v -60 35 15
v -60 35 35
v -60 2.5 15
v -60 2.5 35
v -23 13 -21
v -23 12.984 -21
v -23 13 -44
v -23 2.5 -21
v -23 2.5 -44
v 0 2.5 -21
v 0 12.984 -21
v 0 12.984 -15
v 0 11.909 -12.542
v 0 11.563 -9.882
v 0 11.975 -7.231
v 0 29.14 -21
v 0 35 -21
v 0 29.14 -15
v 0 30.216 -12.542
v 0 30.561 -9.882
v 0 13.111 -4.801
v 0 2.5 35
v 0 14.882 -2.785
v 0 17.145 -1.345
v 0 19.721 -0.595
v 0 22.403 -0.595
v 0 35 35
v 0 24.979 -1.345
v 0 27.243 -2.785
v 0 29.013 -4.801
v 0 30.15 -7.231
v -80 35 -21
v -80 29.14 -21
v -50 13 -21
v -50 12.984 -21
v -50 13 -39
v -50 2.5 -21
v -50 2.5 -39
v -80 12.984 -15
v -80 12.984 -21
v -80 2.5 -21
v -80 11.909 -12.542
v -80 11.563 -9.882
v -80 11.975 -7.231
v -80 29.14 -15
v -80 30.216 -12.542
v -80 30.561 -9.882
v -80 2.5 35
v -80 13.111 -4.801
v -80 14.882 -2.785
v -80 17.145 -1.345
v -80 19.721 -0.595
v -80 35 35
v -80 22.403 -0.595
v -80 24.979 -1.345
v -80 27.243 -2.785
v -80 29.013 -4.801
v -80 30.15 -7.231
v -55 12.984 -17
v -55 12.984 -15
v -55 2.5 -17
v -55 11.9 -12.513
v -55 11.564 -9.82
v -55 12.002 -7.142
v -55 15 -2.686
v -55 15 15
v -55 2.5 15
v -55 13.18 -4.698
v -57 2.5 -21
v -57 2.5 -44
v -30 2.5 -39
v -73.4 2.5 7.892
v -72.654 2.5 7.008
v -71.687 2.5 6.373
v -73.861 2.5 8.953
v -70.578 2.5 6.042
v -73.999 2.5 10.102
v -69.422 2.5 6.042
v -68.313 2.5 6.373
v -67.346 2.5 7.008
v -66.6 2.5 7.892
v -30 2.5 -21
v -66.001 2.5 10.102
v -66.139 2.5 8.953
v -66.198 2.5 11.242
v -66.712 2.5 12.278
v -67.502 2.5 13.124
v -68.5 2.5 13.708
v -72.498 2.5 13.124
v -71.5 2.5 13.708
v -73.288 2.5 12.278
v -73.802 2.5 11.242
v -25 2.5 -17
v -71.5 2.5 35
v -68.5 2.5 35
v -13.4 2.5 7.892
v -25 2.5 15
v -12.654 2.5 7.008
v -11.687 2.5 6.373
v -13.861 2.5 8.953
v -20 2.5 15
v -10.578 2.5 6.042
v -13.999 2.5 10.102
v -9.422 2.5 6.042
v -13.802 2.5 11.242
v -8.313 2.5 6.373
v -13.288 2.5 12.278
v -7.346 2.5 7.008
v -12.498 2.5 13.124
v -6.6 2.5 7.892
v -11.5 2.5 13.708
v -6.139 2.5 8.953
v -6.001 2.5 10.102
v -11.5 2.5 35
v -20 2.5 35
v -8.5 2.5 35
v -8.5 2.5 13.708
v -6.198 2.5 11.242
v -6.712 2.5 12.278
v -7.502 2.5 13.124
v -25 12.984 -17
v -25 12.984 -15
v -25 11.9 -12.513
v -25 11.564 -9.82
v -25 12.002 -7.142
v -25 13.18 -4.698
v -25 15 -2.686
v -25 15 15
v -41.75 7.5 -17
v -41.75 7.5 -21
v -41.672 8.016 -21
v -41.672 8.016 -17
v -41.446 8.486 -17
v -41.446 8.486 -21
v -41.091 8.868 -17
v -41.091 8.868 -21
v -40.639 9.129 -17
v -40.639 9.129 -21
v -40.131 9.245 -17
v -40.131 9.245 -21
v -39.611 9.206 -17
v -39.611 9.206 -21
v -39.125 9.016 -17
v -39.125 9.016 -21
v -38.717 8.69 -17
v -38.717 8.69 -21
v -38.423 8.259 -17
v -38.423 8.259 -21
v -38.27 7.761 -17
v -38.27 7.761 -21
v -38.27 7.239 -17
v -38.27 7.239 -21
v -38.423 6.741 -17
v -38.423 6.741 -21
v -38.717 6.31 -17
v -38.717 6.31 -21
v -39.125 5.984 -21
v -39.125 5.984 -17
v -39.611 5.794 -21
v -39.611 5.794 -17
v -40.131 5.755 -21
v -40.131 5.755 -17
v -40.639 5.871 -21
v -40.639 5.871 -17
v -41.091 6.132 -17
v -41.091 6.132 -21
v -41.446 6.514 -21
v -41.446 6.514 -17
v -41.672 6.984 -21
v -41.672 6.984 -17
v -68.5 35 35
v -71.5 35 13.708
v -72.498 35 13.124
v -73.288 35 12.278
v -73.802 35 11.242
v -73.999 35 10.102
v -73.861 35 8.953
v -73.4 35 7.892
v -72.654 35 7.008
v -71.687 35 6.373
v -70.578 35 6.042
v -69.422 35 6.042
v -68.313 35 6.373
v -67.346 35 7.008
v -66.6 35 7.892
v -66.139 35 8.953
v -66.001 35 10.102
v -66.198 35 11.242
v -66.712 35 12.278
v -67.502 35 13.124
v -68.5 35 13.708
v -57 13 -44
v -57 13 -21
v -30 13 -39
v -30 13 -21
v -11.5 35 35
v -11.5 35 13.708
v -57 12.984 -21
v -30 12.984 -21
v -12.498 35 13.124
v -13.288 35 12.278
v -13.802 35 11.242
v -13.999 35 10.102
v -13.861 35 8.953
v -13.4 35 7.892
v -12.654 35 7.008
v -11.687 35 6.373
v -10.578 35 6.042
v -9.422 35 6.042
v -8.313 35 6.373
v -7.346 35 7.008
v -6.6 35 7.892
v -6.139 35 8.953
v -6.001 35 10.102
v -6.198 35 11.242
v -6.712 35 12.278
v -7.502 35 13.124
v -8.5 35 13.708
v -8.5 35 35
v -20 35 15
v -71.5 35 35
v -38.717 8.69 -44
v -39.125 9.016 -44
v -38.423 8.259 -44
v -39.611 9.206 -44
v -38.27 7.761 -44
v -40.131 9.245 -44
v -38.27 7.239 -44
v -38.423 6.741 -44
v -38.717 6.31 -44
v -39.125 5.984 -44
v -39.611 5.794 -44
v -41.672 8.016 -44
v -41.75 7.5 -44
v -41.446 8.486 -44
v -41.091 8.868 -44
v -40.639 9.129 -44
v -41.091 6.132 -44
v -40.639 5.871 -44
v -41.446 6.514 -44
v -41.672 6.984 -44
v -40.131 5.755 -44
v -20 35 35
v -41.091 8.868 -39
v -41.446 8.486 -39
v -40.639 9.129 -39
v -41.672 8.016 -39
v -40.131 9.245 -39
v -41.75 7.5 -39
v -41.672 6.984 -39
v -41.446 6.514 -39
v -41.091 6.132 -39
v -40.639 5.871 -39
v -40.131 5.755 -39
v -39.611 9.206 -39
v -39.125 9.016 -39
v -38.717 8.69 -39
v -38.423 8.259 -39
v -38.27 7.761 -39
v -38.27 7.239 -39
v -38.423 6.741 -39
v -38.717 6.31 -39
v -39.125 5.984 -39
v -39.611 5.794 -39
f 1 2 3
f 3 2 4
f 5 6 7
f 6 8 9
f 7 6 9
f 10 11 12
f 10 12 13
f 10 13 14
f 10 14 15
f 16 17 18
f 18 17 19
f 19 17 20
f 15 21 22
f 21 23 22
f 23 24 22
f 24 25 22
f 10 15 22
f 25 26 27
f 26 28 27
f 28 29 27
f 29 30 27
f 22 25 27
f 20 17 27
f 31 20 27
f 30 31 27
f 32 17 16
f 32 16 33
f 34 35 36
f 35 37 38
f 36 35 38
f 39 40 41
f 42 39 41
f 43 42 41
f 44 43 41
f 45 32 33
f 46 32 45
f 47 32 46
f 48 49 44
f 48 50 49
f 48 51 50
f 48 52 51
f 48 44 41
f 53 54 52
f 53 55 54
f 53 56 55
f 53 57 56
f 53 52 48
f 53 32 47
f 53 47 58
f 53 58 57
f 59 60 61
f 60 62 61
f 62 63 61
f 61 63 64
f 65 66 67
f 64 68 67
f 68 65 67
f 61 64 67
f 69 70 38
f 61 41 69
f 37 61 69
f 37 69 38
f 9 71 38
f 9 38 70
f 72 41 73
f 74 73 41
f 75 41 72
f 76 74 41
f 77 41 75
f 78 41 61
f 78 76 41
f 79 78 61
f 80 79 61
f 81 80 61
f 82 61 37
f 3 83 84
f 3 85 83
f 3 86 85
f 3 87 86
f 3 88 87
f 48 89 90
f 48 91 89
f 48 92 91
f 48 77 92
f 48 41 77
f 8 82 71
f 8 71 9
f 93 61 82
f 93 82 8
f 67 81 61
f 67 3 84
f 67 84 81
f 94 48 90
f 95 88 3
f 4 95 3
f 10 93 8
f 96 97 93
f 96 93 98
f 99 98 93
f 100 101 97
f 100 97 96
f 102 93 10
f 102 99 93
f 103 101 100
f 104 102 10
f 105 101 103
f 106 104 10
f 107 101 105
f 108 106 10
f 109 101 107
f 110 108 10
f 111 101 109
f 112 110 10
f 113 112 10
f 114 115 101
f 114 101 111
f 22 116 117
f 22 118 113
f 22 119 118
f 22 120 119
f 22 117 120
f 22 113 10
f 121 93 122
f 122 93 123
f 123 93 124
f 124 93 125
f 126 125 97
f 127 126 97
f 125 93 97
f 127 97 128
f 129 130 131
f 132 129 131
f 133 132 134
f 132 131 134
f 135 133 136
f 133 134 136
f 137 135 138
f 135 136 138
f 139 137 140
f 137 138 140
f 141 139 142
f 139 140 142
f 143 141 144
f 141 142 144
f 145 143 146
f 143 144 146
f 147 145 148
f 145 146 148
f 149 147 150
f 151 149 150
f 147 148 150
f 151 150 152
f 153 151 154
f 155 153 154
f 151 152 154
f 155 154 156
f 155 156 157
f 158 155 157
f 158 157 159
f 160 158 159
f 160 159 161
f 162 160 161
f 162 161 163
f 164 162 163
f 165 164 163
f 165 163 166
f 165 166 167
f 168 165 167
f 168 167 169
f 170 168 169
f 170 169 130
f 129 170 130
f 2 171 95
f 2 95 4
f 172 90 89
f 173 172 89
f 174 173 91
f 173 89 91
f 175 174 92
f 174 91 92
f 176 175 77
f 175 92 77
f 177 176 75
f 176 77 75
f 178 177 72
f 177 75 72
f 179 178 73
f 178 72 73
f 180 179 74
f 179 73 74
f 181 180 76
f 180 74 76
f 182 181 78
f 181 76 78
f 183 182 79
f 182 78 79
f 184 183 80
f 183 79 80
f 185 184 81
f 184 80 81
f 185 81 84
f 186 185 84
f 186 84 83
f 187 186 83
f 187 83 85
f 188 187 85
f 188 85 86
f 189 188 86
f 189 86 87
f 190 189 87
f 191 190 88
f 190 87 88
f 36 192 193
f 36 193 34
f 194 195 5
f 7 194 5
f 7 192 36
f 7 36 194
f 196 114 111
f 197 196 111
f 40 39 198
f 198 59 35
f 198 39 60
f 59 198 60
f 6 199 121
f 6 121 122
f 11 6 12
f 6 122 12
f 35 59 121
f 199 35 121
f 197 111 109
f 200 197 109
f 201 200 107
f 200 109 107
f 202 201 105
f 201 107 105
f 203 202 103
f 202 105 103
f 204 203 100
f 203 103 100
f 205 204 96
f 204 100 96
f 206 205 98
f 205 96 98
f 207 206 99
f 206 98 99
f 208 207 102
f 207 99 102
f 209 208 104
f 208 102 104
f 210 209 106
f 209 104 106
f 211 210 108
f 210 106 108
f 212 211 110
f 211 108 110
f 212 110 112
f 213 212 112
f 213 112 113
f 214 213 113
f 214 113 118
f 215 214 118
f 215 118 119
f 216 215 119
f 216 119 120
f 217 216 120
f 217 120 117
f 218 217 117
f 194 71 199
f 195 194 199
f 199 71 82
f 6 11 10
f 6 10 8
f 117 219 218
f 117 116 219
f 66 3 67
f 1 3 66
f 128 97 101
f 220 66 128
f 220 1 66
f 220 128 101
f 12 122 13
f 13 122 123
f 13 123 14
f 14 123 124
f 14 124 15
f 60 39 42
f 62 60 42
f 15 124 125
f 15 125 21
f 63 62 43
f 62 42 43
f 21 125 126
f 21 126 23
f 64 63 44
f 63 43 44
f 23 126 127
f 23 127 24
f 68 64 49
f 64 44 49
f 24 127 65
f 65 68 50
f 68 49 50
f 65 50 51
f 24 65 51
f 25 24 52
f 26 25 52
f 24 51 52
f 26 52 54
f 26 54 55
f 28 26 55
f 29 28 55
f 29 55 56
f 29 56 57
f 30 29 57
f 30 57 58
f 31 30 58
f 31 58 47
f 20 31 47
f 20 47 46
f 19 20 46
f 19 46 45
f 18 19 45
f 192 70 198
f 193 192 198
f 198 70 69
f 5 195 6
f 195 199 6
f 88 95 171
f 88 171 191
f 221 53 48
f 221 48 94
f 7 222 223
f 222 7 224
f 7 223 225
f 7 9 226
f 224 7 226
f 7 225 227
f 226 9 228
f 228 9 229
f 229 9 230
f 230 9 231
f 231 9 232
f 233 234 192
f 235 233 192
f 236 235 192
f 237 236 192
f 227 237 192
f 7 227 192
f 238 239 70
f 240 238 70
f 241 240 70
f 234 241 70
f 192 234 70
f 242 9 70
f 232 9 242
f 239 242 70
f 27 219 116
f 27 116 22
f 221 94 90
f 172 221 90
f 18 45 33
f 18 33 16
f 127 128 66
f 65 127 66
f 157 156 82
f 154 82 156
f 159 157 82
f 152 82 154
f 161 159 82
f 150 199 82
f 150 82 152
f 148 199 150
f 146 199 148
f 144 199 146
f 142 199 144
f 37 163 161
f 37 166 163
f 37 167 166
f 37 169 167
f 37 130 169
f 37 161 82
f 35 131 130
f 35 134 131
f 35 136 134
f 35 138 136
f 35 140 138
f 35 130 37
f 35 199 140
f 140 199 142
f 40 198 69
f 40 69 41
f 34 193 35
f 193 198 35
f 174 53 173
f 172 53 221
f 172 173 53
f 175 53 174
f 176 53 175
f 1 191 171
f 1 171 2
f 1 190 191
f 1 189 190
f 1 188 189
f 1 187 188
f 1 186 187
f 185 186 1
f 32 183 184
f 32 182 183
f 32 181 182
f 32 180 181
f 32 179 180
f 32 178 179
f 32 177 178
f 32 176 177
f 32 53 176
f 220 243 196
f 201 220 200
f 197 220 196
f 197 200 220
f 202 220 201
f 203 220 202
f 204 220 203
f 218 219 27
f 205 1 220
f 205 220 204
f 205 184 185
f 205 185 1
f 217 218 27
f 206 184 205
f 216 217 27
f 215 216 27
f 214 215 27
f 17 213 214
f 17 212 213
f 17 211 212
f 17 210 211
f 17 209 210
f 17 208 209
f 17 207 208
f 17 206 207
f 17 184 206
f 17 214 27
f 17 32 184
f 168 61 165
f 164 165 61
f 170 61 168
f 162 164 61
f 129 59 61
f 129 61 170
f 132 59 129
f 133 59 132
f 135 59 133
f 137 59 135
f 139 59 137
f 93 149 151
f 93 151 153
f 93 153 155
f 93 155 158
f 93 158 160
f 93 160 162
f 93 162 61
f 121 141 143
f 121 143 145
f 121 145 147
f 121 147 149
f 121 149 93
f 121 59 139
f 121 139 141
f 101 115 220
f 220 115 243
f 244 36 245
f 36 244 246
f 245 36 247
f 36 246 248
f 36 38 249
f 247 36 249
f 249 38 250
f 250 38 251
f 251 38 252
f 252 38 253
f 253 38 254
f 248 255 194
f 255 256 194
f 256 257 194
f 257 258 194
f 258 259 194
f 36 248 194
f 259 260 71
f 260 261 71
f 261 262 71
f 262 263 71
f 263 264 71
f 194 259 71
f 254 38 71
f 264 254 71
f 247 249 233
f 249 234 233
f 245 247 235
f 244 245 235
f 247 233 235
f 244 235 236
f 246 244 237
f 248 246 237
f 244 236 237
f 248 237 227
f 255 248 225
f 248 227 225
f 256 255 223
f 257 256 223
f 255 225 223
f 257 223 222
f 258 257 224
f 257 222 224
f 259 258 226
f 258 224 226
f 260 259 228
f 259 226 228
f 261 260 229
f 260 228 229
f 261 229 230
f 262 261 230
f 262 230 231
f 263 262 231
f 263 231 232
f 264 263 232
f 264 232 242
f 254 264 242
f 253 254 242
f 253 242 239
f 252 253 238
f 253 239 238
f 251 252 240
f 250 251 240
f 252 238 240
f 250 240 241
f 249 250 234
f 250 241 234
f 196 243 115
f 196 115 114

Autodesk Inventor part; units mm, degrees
ref_plane "YZ Plane" through (0, 0, 0) normal (1, 0, 0) x (0, 1, 0)
ref_plane "XZ Plane" through (0, 0, 0) normal (0, 1, 0) x (-1, 0, 0)
ref_plane "XY Plane" through (0, 0, 0) normal (0, 0, 1) x (1, 0, 0)
sketch "Sketch1" plane through (0, 0, 0) normal (0, 1, 0) x (-1, 0, 0)
  arc A0 (8.5, 13.7081) -> (11.5, 13.7081) centre (10, 10) ccw
  line L0 (8.5, 20) -> (8.5, 13.7081)
  line L1 (11.5, 20) -> (11.5, 13.7081)
  line L2 (10, 20) -> (10, 18.7339)
  line L3 (20, 20) -> (10, 20)
  line L4 (8.5, 20) -> (0, 20)
  line L5 (0, 20) -> (0, 0)
  line L6 (0, 0) -> (20, 0)
  line L7 (20, 0) -> (20, 20)
  arc A1 (68.5, 13.7081) -> (71.5, 13.7081) centre (70, 10) ccw
  line L8 (68.5, 20) -> (68.5, 13.7081)
  line L9 (71.5, 20) -> (71.5, 13.7081)
  line L10 (70, 20) -> (70, 18.3732)
  line L11 (80, 20) -> (70, 20)
  line L12 (68.5, 20) -> (60.9559, 20)
  line L13 (60.9559, 20) -> (60.9559, 0)
  line L14 (60.9559, 0) -> (80, 0)
  line L15 (80, 0) -> (80, 20)
  line L16 (60.9559, 0) -> (20, 0)
  line L17 (20, 0) -> (20, 20)
  line L18 (20, 20) -> (60.9559, 20)
  line L19 (60.9559, 20) -> (60.9559, 0)
  dimension "d2" = 8
  dimension "d7" = 1.5
  dimension "d8" = 1.5
  dimension "d16" = 10
  dimension "d17" = 8
  dimension "d18" = 1.5
  dimension "d19" = 1.5
  dimension "d20" = 10
  dimension "d22" = 80
  dimension "d23" = 10
  dimension "d24" = 0
  dimension "d25" = 60
  dimension "d26" = 20
  dimension "d27" = 20
  dimension "d28" = 20
  dimension "d29" = 20
  dimension "d30" = 10
  dimension "d31" = 10
  dimension "d32" = 20
extrude "Extrusion1" add sketch "Sketch1" along normal blind 36
sketch "Sketch5" plane through (-80, 0, 0) normal (-1, 0, 0) x (0, 0, 1)
  line L0 (20, 0) -> (20, 36) projected
  line L1 (20, 36) -> (-15, 36)
  line L2 (-15, 6) -> (20, 6)
  line L3 (20, 6) -> (20, 36)
  line L4 (-15, 36) -> (-15, 29.1398)
  line L5 (-15, 12.9843) -> (-15, 6)
  line L6 (0, 0) -> (0, 36) projected
  line L7 (0, 0) -> (0, 36) projected
  line L8 (0, 6) -> (0, 36)
  arc A0 (-15, 12.9843) -> (-15, 29.1398) centre (-10, 21.062) ccw
  dimension "d40" = 30
  dimension "d41" = 35
  dimension "d45" = 20
  dimension "d85" = 19
  dimension "d86" = 5
  dimension "d87" = 15
extrude "Extrusion5" add sketch "Sketch5" against normal blind 80 contours L2 L5 A0 L4 L1 L6
sketch "Sketch13" plane through (0, 36, 0) normal (0, 1, 0) x (1, 0, 0)
  line L0 (-80, -20) -> (-80, 15) projected
  line L1 (-80, -20) -> (-71.5, -20) projected
  line L2 (-71.5, -20) -> (-71.5, -13.7081) projected
  arc A0 (-68.5, -13.7081) -> (-71.5, -13.7081) centre (-70, -10) ccw projected
  line L3 (-68.5, -13.7081) -> (-68.5, -20) projected
  line L4 (-68.5, -20) -> (-11.5, -20) projected
  line L5 (-11.5, -20) -> (-11.5, -13.7081) projected
  arc A1 (-8.5, -13.7081) -> (-11.5, -13.7081) centre (-10, -10) ccw projected
  line L6 (-8.5, -13.7081) -> (-8.5, -20) projected
  line L7 (-8.5, -20) -> (0, -20) projected
  line L8 (0, -20) -> (0, 15) projected
  line L9 (-80, 15) -> (0, 15) projected
  point P0 (0, 0)
extrude "Extrusion11" cut sketch "Sketch13" against normal blind 1
sketch "Sketch16" plane through (-80, 6, -15) normal (0, 0, -1) x (-1, 0, 0)
  line L0 (-80, -6) -> (0, -6) projected
  line L1 (0, 6.9843) -> (-80, 6.9843) projected
  line L2 (-80, -6) -> (0, -6)
  line L3 (0, -6) -> (0, 6.9843)
  line L4 (0, 6.9843) -> (-80, 6.9843)
  line L5 (-80, 6.9843) -> (-80, -6)
  line L6 (0, -6) -> (0, 29) projected
  line L7 (0, 23.1398) -> (-80, 23.1398) projected
  line L8 (0, 29) -> (-80, 29)
  line L9 (-80, 29) -> (-80, 23.1398)
  line L10 (-80, 23.1398) -> (0, 23.1398)
  line L11 (0, 23.1398) -> (0, 29)
extrude "Extrusion13" add sketch "Sketch16" along normal blind 6
sketch "Sketch17" plane through (0, 0, 0) normal (0, 0, -1) x (-1, 0, 0)
  line L0 (80, 6) -> (0, 6) projected
  line L1 (0, 0) -> (80, 0) projected
  line L2 (80, 6) -> (0, 6) projected
  line L3 (80, 6) -> (80, 0)
  line L4 (0, 6) -> (0, 0)
extrude "Extrusion14" add sketch "Sketch17" along normal blind 20
sketch "Sketch18" plane through (-68.5, 0, 20) normal (0, 0, 1) x (1, 0, 0)
  line L0 (13.5, 0) -> (43.5, 0)
  line L1 (43.5, 0) -> (43.5, 15)
  line L2 (43.5, 15) -> (13.5, 15)
  line L3 (13.5, 15) -> (13.5, 0)
  line L4 (-11.5, 0) -> (-11.5, 35) projected
  line L5 (0, 0) -> (57, 0) projected
  point P0 (68.5, 0)
  dimension "d107" = 30
  dimension "d108" = 25
  dimension "d109" = 15
  dimension "d110" = 0
extrude "Extrusion15" cut sketch "Sketch18" against normal blind 37
sketch "Sketch19" plane through (0, 0, 0) normal (0, -1, 0) x (1, 0, 0)
  line L0 (-80, -21) -> (0, -21) projected
  line L1 (-30, -21) -> (-23, -21)
  line L2 (-23, -21) -> (-23, -44)
  line L3 (-23, -44) -> (-30, -44)
  line L4 (-30, -44) -> (-30, -21)
  line L5 (-30, -44) -> (-50, -44)
  line L6 (-50, -44) -> (-50, -39)
  line L7 (-50, -39) -> (-30, -39)
  line L8 (-30, -39) -> (-30, -44)
  line L9 (-50, -44) -> (-57, -44)
  line L10 (-57, -44) -> (-57, -21)
  line L11 (-57, -21) -> (-50, -21)
  line L12 (-50, -21) -> (-50, -44)
  line L13 (0, -21) -> (0, 20) projected
  point P0 (0, 0)
  dimension "d113" = 7
  dimension "d114" = 7
  dimension "d115" = 5
  dimension "d116" = 18
  dimension "d117" = 20
  dimension "d118" = 23
extrude "Extrusion16" add sketch "Sketch19" against normal blind 15.5 contours L0 L12 L6 L9 L10 | L0 L2 L3 L4 | L7 L4 L5 L6
sketch "Sketch20" plane through (-23, 0, -44) normal (0, 0, -1) x (-1, 0, 0)
  circle A0 centre (17, 7.5) radius 1.75
  line L0 (34, 0) -> (0, 0) projected
  line L1 (-23, 12.9843) -> (-23, 0) projected
  dimension "d121" = 3.5
  dimension "d122" = 7.5
  dimension "d123" = 40
extrude "Extrusion17" cut sketch "Sketch20" against normal blind 80
sketch "Sketch21" plane through (0, 0, 0) normal (0, -1, 0) x (1, 0, 0)
  line L0 (0, -0.5) -> (-80, -0.5) projected
  line L1 (0, -21) -> (-23, -21) projected
  line L2 (0, -21) -> (0, 20) projected
  line L3 (0, 20) -> (-8.5, 20) projected
  line L4 (-8.5, 20) -> (-8.5, 13.7081) projected
  arc A0 (-11.5, 13.7081) -> (-8.5, 13.7081) centre (-10, 10) ccw projected
  line L5 (-11.5, 13.7081) -> (-11.5, 20) projected
  line L6 (-25, 20) -> (-11.5, 20) projected
  line L7 (-25, 20) -> (-25, -17) projected
  line L8 (-25, -17) -> (-55, -17) projected
  line L9 (-55, -17) -> (-55, 20) projected
  line L10 (-68.5, 20) -> (-55, 20) projected
  line L11 (-68.5, 13.7081) -> (-68.5, 20) projected
  arc A1 (-71.5, 13.7081) -> (-68.5, 13.7081) centre (-70, 10) ccw projected
  line L12 (-71.5, 20) -> (-71.5, 13.7081) projected
  line L13 (-80, 20) -> (-71.5, 20) projected
  line L14 (-80, 20) -> (-80, -21) projected
  line L15 (-57, -21) -> (-80, -21) projected
  line L16 (-57, -21) -> (-57, -44) projected
  line L17 (-57, -44) -> (-23, -44) projected
  line L18 (-23, -44) -> (-23, -21) projected
  line L19 (-30, -21) -> (-30, -39) projected
  line L20 (-30, -39) -> (-50, -39) projected
  line L21 (-50, -39) -> (-50, -21) projected
  line L22 (-30, -21) -> (-50, -21) projected
  point P0 (0, 0)
extrude "Extrusion18" cut sketch "Sketch21" against normal blind 2.5 contours L2 L1 L18 L17 L16 L15 L14 L0 L9 L8 L7 | L0 L7 L6 L5 A0 L4 L3 L2 | L0 L14 L13 L12 A1 L11 L10 L9 | L19 L20 L21 L22
sketch "Sketch22" plane through (-68.5, 35, 20) normal (0, 0, 1) x (1, 0, 0)
  line L0 (0, -32.5) -> (13.5, -32.5) projected
  line L1 (13.5, -32.5) -> (13.5, -20) projected
  line L2 (13.5, -20) -> (43.5, -20) projected
  line L3 (43.5, -20) -> (43.5, -32.5) projected
  line L4 (43.5, -32.5) -> (57, -32.5) projected
  line L5 (57, -32.5) -> (57, 0) projected
  line L6 (57, 0) -> (0, 0) projected
  line L7 (0, -32.5) -> (0, 0) projected
  line L8 (60, -32.5) -> (68.5, -32.5) projected
  line L9 (68.5, -32.5) -> (68.5, 0) projected
  line L10 (68.5, 0) -> (60, 0) projected
  line L11 (60, -32.5) -> (60, 0) projected
  line L12 (-11.5, -32.5) -> (-3, -32.5) projected
  line L13 (-3, -32.5) -> (-3, 0) projected
  line L14 (-3, 0) -> (-11.5, 0) projected
  line L15 (-11.5, -32.5) -> (-11.5, 0) projected
  point P0 (68.5, -35)
extrude "Extrusion19" add sketch "Sketch22" along normal blind 15
sketch "Sketch23" plane through (-68.5, 35, 35) normal (0, 0, 1) x (1, 0, 0)
  line L0 (-11.5, 0) -> (68.5, 0) projected
  line L1 (48.5, 0) -> (8.5, 0)
  line L2 (8.5, 0) -> (8.5, -32.5)
  line L3 (8.5, -32.5) -> (48.5, -32.5)
  line L4 (48.5, -32.5) -> (48.5, 0)
  line L5 (68.5, -32.5) -> (68.5, 0) projected
  line L6 (-11.5, 0) -> (-11.5, -32.5) projected
  point P0 (57, 0)
  point P1 (8.5, 0)
  dimension "d130" = 20
  dimension "d131" = 20
extrude "Extrusion20" cut sketch "Sketch23" against normal blind 20
sketch "Sketch24" plane through (0, 15.5, 0) normal (0, 1, 0) x (1, 0, 0)
  line L0 (-23, 21) -> (-23, 44) projected
  line L1 (-23, 44) -> (-57, 44) projected
  line L2 (-57, 44) -> (-57, 21) projected
  line L3 (-57, 21) -> (-50, 21) projected
  line L4 (-50, 21) -> (-50, 39) projected
  line L5 (-50, 39) -> (-30, 39) projected
  line L6 (-30, 39) -> (-30, 21) projected
  line L7 (-30, 21) -> (-23, 21) projected
  point P0 (0, 0)
extrude "Extrusion21" cut sketch "Sketch24" against normal blind 2.5
equation "\"d2\" = RodDiameter"
equation "\"d17\" = d2"
equation "\"d85\" = XLinearBearingOD"
equation "\"RodDiameter\" = 8"
equation "\"VerticalBearingOD\" = 16"
equation "\"PrintingClearance\" = 0.2"
equation "\"d21\" = 8"
equation "\"TubeID\" = 18"
equation "\"XLinearBearingOD\" = 19"
properties part number "GantryHolder" material "PET Plastic"
